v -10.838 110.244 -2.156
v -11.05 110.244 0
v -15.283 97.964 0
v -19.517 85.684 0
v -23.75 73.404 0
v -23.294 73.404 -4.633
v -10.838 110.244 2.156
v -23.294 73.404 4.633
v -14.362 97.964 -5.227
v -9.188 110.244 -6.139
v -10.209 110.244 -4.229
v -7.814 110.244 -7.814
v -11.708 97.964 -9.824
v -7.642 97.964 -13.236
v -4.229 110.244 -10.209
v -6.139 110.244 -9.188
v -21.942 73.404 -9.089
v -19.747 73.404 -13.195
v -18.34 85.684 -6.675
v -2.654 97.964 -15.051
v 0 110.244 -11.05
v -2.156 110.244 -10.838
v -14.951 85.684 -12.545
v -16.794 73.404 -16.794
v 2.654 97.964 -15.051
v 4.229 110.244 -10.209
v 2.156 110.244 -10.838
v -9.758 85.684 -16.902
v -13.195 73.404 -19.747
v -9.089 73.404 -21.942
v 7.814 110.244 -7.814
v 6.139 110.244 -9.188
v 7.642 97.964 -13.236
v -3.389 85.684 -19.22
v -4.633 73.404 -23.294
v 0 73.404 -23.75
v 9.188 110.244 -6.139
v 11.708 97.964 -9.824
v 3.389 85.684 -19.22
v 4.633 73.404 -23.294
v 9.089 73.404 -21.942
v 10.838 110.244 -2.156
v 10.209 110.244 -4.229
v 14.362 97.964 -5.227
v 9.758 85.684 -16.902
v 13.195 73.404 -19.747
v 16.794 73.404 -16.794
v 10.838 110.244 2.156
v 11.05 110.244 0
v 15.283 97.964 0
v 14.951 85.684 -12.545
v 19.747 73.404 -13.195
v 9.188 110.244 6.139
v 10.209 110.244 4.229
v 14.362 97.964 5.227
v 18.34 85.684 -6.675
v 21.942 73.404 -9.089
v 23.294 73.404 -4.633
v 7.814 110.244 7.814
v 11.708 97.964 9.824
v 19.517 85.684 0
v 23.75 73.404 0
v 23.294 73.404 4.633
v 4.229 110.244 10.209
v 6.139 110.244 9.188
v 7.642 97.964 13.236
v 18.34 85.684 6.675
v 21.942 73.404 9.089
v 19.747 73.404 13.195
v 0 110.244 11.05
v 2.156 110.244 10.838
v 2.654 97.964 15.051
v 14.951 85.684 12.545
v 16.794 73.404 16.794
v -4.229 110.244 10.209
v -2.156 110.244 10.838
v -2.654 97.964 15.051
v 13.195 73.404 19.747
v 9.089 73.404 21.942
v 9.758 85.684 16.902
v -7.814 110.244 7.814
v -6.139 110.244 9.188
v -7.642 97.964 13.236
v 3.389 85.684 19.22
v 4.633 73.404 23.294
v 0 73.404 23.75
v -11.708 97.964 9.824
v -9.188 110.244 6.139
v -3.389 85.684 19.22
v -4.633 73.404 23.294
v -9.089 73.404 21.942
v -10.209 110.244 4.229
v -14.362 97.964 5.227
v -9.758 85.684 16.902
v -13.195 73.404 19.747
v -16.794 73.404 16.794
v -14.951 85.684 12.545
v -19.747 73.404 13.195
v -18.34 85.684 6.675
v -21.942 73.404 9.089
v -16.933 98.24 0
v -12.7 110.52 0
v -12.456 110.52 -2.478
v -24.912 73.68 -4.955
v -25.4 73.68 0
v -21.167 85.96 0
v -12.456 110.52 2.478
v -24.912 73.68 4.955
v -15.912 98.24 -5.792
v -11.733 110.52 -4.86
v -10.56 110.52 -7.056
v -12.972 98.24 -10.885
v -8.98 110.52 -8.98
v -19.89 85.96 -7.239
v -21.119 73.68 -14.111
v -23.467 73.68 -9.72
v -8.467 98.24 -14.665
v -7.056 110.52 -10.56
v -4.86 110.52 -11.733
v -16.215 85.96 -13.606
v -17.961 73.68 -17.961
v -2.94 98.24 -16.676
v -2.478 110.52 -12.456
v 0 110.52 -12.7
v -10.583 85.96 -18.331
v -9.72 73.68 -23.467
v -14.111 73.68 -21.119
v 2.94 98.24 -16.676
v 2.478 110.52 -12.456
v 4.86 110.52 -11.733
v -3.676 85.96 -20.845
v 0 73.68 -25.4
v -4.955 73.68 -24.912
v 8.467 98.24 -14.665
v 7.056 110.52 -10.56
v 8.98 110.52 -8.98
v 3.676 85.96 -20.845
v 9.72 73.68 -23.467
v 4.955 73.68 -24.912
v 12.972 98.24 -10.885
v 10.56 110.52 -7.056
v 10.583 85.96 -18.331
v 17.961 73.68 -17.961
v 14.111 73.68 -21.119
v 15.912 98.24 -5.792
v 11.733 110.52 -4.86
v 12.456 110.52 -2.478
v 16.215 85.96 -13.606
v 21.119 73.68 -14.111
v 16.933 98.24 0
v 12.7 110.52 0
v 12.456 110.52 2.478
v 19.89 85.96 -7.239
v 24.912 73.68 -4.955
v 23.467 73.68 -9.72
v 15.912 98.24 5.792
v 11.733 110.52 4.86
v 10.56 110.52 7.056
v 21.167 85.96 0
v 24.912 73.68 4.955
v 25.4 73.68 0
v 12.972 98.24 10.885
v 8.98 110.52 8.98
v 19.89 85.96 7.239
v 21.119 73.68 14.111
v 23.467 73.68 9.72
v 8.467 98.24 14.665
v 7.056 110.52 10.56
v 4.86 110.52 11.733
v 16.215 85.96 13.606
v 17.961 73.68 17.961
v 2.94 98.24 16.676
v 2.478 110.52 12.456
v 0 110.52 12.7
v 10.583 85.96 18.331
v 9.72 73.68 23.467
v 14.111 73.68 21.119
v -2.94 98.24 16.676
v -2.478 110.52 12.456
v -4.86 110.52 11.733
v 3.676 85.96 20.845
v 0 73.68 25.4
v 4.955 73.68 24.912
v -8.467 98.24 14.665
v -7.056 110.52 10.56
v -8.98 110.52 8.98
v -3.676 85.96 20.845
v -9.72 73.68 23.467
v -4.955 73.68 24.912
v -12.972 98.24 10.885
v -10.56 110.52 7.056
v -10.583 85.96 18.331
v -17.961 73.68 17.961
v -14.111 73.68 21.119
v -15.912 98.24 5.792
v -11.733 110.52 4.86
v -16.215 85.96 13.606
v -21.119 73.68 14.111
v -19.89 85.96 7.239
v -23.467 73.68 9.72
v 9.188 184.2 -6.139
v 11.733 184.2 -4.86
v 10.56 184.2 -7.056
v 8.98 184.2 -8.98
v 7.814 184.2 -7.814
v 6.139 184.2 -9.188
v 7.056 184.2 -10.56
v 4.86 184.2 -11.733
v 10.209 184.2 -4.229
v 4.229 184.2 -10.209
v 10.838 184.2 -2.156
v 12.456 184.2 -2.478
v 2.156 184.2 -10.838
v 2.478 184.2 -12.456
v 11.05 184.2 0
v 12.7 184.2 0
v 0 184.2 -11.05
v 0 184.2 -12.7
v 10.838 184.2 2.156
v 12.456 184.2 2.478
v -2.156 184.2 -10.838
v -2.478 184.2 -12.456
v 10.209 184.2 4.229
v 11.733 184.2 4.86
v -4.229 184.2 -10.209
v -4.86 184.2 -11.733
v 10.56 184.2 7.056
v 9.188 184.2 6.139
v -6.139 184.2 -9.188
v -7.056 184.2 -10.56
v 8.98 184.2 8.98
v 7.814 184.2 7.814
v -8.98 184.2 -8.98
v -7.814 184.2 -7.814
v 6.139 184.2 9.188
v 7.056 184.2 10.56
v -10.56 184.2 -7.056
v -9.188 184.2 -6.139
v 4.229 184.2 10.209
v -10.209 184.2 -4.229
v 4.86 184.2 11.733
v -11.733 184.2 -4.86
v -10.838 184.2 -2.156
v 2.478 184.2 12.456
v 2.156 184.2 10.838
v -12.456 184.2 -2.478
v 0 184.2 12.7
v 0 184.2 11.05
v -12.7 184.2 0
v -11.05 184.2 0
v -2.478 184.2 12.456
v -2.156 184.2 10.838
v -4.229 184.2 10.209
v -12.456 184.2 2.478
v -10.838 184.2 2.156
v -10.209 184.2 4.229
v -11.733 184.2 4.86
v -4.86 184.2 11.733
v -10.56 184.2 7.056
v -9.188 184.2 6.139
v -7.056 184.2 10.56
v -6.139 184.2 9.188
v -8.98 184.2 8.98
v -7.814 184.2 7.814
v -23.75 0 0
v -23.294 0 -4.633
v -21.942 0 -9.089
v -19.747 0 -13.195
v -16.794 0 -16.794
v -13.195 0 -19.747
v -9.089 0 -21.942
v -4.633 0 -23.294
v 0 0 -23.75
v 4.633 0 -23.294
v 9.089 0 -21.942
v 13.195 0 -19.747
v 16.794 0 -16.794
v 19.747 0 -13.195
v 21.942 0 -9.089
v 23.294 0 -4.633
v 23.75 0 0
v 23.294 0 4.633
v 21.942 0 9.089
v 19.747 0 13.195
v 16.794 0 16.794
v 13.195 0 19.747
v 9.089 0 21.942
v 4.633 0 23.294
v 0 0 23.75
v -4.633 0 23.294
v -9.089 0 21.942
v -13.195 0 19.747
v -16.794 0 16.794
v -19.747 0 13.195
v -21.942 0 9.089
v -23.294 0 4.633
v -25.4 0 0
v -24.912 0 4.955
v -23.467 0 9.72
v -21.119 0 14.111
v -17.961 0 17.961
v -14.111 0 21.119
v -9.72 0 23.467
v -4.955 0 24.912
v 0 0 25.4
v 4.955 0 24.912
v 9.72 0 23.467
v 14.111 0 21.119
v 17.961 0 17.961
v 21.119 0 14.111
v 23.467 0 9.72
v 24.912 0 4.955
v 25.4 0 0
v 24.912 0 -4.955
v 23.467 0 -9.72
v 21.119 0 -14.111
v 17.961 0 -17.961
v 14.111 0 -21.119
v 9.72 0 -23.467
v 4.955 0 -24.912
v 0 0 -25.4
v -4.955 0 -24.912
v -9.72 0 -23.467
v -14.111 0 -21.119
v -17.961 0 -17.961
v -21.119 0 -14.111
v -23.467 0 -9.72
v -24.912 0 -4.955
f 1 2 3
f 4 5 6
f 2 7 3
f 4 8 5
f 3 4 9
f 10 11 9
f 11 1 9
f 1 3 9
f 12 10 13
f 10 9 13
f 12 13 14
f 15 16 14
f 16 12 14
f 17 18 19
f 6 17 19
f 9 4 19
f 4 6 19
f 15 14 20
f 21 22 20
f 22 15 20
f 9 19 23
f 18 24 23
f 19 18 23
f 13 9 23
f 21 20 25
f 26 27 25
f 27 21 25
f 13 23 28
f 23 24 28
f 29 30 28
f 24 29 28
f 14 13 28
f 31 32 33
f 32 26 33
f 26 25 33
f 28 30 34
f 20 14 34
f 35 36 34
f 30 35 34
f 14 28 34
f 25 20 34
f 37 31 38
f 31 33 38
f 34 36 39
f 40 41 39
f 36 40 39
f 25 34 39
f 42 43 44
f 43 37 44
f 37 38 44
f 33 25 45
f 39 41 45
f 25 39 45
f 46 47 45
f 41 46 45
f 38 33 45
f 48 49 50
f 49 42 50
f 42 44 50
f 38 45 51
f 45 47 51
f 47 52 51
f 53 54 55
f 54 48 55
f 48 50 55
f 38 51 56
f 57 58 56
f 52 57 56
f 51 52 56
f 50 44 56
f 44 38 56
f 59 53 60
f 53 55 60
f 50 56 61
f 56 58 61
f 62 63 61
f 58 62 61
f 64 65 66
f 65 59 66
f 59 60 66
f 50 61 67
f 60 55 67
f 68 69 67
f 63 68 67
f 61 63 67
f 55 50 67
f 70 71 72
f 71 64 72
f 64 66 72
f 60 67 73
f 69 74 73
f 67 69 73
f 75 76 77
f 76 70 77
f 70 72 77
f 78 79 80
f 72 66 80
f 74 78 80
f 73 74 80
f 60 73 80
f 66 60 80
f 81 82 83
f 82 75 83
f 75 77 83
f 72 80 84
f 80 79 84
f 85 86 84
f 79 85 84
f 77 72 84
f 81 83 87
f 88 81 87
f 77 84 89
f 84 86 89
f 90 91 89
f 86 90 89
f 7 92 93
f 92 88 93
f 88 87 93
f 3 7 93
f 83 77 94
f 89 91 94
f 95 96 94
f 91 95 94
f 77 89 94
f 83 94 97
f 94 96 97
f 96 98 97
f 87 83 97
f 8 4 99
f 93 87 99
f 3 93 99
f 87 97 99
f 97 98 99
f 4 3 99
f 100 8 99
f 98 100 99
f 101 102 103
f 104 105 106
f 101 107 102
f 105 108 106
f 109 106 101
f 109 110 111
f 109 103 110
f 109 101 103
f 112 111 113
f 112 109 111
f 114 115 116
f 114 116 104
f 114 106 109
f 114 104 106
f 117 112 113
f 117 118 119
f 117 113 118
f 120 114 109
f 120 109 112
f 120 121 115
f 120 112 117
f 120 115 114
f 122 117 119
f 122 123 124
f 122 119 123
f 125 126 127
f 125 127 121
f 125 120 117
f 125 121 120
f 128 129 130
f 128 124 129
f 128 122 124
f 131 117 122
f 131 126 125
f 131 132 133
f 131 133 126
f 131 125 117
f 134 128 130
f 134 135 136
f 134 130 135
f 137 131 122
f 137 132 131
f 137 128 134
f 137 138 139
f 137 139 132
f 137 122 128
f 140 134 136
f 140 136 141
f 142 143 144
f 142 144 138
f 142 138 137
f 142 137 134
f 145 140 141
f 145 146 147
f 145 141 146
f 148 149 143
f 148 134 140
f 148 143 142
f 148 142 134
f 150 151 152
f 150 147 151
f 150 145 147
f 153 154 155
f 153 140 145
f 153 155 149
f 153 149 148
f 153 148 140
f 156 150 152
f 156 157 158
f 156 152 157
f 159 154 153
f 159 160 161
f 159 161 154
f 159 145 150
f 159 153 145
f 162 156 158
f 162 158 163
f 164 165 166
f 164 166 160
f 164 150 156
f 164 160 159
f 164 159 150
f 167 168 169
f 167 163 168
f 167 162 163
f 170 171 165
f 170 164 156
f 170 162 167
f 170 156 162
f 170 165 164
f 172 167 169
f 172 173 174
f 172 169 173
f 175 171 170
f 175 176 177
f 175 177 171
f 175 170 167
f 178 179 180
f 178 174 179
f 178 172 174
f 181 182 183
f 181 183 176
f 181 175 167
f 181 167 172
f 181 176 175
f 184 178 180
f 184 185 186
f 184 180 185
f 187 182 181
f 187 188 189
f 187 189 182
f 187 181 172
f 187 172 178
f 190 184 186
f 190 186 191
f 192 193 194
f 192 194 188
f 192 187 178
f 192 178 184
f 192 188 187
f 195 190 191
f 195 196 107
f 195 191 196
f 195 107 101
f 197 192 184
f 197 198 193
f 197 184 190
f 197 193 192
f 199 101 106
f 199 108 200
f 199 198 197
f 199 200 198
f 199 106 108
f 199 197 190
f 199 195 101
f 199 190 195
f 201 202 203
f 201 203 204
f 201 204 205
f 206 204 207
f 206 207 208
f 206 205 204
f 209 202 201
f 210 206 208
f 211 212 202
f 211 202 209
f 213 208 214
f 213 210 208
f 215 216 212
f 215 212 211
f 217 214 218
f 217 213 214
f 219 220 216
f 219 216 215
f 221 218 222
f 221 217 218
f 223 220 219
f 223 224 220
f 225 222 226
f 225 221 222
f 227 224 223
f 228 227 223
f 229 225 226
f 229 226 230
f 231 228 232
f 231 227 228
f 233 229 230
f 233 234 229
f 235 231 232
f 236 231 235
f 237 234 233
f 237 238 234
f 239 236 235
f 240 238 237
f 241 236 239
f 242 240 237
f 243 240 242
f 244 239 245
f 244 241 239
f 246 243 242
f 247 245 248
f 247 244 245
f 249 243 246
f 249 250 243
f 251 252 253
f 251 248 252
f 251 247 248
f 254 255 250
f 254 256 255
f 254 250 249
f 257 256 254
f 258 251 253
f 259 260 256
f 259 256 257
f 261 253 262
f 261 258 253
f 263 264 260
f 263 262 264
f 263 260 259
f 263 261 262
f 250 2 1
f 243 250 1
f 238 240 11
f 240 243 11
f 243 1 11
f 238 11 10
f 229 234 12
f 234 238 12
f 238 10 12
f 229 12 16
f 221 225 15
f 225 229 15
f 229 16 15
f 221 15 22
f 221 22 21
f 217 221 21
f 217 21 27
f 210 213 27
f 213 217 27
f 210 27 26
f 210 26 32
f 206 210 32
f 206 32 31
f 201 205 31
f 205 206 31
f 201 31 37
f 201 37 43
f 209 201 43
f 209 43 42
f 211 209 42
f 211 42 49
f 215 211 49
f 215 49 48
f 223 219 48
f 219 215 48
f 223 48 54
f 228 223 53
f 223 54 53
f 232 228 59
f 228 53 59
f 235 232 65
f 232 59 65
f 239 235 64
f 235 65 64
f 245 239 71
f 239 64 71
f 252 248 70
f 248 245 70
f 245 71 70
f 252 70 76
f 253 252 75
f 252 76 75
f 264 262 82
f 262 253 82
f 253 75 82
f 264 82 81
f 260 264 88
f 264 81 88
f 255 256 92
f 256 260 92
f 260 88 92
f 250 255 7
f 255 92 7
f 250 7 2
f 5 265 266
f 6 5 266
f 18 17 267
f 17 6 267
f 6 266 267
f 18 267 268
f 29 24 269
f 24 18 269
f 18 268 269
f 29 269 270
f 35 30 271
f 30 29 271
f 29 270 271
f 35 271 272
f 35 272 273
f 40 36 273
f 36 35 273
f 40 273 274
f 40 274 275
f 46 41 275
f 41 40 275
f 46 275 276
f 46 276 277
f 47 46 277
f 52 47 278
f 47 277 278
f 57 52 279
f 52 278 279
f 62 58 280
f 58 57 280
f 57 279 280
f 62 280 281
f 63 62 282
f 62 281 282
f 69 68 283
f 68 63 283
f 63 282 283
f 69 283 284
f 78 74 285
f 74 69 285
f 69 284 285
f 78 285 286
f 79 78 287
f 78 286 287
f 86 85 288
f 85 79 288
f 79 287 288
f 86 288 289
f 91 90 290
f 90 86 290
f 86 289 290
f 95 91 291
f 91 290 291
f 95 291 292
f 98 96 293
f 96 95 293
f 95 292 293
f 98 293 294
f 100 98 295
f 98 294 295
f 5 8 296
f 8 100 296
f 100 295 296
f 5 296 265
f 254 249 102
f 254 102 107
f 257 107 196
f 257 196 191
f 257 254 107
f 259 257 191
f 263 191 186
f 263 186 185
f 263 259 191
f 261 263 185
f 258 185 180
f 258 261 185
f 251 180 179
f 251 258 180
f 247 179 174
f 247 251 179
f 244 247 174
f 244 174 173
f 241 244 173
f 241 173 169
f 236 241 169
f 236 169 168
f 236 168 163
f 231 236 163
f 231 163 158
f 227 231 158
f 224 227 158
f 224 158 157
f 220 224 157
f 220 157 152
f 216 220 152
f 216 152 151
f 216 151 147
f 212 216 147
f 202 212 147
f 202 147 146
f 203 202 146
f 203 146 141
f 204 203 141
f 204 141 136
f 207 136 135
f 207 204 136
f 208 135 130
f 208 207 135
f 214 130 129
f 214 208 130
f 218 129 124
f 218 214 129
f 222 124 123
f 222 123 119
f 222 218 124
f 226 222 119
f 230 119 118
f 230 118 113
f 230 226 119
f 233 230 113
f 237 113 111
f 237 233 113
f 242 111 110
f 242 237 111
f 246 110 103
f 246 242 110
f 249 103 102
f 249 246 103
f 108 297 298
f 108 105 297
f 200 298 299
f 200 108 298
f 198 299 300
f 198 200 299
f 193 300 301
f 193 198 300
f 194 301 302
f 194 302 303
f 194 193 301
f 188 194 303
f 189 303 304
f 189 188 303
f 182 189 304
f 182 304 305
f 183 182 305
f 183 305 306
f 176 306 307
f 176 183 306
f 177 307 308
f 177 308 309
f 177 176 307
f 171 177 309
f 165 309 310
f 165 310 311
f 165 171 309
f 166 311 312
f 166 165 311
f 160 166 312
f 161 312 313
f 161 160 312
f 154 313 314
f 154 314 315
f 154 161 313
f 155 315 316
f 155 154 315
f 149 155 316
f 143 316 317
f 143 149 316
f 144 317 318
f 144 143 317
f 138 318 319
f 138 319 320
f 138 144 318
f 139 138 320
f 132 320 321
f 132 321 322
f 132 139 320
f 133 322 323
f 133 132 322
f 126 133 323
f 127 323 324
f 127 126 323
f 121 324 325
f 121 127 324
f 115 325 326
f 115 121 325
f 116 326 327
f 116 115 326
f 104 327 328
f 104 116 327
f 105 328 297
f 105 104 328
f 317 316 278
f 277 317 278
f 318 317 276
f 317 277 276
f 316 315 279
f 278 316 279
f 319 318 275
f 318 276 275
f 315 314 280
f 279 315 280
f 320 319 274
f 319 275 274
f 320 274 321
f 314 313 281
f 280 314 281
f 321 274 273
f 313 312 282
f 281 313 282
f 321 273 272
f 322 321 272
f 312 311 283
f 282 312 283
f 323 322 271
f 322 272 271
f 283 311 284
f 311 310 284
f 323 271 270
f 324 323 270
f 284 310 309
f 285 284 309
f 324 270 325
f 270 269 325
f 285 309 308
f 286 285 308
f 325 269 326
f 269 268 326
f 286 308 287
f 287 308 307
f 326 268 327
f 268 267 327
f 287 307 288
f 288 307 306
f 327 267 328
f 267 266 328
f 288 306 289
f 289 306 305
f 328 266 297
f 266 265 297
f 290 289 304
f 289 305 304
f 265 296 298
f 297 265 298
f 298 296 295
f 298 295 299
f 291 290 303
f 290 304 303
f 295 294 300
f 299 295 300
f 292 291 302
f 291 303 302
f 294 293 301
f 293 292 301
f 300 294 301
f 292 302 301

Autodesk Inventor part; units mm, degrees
ref_plane "YZ Plane" through (0, 0, 0) normal (1, 0, 0) x (0, 1, 0)
ref_plane "XZ Plane" through (0, 0, 0) normal (0, 1, 0) x (-1, 0, 0)
ref_plane "XY Plane" through (0, 0, 0) normal (0, 0, 1) x (1, 0, 0)
sketch "Sketch1" plane through (0, 0, 0) normal (0, 0, 1) x (1, 0, 0)
  line L0 (0, 0) -> (0, 68.7718)
  line L1 (0, 0) -> (-35.2548, 0) construction
  line L2 (-25.4, 0) -> (-25.4, 73.68)
  line L3 (-25.4, 73.68) -> (-12.7, 110.52)
  line L4 (-12.7, 110.52) -> (-12.7, 184.2)
  line L5 (-11.05, 184.2) -> (-11.05, 110.2436)
  line L6 (-11.05, 110.2436) -> (-23.75, 73.4036)
  line L7 (-23.75, 73.4036) -> (-23.75, 0)
  line L8 (-25.4, 0) -> (-23.75, 0)
  line L9 (-12.7, 184.2) -> (-11.05, 184.2)
  dimension "d0" = 1.65
  dimension "d1" = 25.4
  dimension "d2" = 73.68
  dimension "d3" = 73.68
  dimension "d4" = 184.2
  dimension "d5" = 50.8
revolve "Revolution1" add sketch "Sketch1" angle 360 about axis through (0, 0, 0) along (0, 1, 0)
equation "\"d2\" = 0.4 * d4"
equation "\"d3\" = d2"
properties part number "ASME BPE CON RED-50.8-25.4"
